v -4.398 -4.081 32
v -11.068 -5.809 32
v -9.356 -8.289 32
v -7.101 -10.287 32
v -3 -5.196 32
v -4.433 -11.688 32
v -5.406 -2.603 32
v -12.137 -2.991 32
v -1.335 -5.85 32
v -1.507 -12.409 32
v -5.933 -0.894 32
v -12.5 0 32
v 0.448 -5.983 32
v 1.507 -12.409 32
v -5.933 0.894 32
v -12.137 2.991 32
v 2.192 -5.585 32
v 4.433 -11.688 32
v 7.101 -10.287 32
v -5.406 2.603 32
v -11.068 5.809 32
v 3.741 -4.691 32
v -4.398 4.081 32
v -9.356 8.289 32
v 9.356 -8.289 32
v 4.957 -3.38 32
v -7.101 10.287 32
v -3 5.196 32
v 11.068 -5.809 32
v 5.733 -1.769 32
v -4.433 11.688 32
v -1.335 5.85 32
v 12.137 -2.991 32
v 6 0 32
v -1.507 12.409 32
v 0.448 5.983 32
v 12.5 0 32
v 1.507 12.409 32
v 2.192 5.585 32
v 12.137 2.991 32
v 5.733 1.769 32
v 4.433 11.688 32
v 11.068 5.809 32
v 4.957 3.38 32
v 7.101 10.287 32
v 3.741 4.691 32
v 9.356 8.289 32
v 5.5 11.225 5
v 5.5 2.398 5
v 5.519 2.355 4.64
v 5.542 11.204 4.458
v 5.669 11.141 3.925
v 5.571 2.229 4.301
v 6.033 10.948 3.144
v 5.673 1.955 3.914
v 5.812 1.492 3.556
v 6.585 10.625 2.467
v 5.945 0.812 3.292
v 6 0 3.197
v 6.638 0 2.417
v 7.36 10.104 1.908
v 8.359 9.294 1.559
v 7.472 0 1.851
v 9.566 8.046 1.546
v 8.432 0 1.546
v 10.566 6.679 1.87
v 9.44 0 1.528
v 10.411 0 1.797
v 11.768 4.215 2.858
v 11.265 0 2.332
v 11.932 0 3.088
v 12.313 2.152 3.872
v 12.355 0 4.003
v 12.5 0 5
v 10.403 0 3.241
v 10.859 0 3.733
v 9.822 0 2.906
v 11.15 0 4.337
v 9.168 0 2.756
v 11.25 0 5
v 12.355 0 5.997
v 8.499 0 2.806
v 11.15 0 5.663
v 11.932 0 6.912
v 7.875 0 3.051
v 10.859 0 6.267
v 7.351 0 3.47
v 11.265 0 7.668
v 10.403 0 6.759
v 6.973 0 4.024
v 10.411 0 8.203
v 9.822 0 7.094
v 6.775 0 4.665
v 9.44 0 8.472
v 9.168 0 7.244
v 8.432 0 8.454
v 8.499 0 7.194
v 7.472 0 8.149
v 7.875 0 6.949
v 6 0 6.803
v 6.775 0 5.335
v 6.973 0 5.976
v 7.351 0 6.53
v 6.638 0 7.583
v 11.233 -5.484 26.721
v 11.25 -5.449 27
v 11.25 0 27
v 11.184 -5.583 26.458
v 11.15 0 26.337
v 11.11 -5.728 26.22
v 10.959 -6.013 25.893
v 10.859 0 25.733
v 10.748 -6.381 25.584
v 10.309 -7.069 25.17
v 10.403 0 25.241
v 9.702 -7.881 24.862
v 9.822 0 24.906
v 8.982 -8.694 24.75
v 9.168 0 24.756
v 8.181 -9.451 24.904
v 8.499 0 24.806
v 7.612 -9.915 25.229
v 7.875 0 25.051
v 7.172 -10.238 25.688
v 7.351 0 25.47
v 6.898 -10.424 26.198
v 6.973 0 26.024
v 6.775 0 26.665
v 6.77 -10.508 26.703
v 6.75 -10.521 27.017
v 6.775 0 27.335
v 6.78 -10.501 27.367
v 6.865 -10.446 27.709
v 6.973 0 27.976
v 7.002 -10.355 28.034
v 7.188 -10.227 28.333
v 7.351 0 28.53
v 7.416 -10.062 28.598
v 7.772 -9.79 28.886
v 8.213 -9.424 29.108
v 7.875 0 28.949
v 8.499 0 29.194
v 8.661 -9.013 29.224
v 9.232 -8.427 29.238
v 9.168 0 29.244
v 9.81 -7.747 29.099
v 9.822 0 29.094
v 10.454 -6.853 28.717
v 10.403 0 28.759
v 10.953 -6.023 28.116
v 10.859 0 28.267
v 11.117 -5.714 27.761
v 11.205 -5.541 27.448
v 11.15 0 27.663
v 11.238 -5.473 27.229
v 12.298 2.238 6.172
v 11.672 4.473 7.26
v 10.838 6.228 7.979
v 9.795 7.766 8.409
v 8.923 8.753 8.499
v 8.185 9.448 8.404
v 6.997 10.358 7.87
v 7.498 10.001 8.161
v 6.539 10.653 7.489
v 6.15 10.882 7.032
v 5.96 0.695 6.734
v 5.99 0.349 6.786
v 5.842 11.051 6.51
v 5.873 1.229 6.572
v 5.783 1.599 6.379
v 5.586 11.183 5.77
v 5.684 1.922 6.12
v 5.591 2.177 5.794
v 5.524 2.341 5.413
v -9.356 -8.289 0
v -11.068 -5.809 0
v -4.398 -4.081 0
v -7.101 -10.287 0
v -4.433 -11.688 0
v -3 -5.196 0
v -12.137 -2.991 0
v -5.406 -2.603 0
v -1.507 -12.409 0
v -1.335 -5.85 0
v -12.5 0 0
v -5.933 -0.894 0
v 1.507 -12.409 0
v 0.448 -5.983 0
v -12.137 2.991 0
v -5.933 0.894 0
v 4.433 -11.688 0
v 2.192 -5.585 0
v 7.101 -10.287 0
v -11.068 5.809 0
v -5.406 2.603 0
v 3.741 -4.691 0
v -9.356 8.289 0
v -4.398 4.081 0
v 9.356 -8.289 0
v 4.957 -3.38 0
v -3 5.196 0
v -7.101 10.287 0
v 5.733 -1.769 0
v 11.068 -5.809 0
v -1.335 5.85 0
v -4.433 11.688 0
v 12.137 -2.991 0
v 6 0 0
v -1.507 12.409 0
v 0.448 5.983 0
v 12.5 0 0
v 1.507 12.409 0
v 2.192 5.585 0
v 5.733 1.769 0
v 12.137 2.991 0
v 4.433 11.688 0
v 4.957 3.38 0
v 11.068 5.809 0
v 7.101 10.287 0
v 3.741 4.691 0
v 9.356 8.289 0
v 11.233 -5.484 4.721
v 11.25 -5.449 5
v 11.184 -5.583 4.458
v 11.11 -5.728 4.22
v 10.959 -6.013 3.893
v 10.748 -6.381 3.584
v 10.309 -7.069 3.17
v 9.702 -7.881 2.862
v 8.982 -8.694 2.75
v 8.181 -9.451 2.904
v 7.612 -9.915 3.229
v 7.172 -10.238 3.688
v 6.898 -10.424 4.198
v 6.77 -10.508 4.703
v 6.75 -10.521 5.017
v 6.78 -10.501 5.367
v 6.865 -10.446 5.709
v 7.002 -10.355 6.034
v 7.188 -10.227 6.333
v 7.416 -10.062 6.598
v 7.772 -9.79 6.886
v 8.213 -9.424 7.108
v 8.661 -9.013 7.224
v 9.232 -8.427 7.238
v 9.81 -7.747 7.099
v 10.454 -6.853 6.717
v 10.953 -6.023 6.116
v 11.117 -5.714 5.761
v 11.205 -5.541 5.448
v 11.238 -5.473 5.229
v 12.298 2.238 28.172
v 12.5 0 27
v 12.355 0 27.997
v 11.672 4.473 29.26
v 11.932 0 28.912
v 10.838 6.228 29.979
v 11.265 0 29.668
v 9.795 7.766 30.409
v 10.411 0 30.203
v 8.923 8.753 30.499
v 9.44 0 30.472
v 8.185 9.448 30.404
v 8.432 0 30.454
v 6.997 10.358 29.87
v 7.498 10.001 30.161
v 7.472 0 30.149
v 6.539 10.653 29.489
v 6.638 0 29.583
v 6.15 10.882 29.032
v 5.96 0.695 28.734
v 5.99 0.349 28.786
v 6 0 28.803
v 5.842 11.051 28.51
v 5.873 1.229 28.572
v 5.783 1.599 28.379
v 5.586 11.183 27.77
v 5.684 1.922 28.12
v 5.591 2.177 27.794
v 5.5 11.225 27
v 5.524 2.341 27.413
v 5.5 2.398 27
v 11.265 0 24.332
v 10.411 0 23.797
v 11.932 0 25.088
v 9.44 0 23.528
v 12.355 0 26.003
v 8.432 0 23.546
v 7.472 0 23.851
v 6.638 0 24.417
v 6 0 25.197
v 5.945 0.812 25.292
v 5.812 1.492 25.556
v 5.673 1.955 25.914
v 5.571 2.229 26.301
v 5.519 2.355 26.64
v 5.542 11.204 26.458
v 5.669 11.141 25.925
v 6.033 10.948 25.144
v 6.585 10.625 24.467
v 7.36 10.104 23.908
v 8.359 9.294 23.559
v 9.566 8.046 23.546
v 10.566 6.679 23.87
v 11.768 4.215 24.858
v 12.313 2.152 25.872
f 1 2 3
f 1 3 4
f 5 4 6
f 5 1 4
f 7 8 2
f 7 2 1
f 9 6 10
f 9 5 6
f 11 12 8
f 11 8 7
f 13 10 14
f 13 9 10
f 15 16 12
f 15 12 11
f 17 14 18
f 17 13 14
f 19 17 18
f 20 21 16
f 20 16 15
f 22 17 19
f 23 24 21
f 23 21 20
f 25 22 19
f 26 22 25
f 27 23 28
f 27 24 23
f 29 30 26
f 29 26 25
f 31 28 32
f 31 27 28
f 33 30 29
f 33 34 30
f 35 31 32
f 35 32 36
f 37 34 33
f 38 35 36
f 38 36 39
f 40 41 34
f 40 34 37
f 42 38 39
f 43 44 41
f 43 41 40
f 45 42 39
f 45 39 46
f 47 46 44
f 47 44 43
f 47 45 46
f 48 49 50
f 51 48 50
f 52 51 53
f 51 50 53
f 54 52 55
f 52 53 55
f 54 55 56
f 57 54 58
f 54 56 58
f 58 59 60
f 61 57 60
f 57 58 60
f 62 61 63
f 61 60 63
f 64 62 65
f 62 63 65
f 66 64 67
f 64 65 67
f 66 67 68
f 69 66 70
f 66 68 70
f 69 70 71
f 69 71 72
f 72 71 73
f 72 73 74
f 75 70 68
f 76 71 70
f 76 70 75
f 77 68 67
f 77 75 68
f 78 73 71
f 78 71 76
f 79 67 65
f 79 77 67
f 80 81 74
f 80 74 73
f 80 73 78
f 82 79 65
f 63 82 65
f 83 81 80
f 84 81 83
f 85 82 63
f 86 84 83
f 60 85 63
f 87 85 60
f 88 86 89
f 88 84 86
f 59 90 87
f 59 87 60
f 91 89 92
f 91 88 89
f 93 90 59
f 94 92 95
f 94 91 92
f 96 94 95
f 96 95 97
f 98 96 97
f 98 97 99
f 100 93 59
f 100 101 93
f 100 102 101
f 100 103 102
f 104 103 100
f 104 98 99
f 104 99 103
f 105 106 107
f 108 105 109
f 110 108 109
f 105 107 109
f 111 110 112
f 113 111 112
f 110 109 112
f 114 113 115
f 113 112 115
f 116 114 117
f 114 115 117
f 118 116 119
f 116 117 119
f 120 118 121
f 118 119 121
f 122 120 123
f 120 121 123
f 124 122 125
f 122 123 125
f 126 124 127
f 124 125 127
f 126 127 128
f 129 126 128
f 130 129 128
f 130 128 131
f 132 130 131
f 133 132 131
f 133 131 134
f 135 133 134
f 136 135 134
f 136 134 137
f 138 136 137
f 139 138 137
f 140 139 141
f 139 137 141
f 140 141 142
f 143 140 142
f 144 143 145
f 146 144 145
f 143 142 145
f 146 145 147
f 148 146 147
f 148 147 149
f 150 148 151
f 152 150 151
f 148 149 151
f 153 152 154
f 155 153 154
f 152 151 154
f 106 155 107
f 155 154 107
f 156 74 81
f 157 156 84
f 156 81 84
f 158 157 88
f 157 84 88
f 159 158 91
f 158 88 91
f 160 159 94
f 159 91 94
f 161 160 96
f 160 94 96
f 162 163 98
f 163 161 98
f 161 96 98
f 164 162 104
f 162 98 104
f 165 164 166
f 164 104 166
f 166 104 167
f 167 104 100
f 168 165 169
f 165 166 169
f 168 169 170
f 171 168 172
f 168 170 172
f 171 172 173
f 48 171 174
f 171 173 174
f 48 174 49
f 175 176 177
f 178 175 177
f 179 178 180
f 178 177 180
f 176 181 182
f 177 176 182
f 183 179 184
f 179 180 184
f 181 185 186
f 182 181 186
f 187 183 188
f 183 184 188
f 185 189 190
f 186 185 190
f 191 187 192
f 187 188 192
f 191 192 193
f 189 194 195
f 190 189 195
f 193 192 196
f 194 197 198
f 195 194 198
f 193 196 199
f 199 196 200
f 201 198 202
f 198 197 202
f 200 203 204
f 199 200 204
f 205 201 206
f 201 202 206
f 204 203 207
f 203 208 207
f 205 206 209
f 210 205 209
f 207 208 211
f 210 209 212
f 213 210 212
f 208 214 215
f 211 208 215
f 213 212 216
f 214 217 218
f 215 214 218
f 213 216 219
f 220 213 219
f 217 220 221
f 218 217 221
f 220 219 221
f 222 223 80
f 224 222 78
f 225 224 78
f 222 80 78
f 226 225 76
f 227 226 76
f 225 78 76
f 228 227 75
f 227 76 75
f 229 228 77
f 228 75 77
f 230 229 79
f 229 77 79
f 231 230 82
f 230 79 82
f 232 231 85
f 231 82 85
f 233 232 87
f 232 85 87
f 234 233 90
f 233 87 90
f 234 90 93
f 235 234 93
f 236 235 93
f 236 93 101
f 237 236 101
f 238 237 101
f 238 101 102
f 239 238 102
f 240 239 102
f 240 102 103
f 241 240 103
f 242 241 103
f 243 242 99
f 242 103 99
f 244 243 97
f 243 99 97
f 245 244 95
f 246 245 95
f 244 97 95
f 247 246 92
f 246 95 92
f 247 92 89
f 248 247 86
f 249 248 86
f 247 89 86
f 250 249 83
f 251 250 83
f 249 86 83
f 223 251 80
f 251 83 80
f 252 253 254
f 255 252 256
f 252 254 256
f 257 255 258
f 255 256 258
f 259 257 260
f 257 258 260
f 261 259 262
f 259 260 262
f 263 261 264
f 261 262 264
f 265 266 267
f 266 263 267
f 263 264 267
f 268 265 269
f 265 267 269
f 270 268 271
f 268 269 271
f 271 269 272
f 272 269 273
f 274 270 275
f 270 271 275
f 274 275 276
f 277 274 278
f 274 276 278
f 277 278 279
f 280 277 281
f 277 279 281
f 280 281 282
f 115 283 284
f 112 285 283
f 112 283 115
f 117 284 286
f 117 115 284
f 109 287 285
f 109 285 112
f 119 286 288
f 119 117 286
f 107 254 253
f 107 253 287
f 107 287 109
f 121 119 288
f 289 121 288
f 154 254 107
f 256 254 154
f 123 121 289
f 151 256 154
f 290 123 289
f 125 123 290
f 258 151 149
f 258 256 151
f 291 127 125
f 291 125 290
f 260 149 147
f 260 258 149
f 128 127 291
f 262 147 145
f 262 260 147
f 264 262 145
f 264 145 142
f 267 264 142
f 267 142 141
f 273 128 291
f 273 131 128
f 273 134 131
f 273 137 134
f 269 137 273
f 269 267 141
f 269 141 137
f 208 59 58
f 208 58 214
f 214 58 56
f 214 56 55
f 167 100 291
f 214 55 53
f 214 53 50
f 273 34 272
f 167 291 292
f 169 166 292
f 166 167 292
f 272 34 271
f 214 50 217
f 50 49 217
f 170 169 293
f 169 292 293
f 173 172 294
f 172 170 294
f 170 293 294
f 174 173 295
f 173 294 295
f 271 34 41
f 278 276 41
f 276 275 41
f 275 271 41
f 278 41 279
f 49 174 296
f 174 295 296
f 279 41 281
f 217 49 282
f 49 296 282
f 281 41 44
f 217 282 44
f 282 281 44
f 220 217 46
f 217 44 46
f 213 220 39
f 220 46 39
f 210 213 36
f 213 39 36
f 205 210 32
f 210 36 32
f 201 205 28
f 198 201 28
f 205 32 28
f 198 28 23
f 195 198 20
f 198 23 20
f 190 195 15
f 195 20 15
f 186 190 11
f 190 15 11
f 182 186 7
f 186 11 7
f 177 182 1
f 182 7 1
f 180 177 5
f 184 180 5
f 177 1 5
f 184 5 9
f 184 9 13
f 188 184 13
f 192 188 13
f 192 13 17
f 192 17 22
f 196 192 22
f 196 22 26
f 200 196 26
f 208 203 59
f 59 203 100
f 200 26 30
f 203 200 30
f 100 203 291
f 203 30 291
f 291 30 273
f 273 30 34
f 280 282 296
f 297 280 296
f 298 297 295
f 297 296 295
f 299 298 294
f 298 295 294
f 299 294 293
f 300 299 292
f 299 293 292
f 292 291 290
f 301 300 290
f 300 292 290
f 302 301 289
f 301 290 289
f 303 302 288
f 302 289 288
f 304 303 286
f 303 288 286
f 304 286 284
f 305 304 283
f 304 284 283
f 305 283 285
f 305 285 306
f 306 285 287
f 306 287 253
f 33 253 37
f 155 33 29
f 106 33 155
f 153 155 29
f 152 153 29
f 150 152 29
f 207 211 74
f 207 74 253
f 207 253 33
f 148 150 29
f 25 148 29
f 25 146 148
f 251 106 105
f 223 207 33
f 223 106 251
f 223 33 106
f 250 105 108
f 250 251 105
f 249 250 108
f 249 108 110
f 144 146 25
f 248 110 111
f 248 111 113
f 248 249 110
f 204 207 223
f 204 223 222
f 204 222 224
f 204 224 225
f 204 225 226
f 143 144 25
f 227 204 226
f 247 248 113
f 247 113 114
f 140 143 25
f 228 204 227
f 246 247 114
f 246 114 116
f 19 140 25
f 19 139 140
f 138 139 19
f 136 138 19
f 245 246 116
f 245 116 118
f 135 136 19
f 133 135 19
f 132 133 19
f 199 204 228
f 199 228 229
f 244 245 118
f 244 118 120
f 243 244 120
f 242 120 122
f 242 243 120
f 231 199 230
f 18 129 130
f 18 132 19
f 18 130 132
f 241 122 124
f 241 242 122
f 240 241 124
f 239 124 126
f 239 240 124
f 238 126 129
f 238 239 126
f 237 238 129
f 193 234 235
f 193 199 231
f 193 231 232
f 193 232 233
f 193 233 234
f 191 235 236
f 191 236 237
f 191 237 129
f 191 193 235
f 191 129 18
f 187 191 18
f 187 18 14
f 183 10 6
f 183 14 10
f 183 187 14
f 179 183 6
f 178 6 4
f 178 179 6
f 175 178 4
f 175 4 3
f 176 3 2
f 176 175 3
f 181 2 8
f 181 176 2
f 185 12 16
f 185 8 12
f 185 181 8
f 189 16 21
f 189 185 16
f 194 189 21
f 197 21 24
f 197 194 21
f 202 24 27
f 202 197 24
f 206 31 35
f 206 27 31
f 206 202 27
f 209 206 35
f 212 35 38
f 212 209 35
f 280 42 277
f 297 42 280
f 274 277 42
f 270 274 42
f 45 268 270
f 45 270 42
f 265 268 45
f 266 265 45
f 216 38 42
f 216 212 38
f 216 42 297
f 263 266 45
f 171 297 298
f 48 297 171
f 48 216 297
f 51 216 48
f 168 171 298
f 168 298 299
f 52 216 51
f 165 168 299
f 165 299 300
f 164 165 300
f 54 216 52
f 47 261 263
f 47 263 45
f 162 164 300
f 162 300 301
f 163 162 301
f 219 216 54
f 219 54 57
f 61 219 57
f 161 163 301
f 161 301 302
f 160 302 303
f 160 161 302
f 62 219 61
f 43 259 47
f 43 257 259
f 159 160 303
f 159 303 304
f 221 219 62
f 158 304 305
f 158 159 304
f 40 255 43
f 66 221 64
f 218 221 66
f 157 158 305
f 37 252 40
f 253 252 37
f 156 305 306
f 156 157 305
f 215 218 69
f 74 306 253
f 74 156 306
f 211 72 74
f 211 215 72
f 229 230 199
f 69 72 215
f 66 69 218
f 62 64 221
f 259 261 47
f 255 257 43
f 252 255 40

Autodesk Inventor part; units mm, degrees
ref_plane "YZ Plane" through (0, 0, 0) normal (1, 0, 0) x (0, 1, 0)
ref_plane "XZ Plane" through (0, 0, 0) normal (0, 1, 0) x (-1, 0, 0)
ref_plane "XY Plane" through (0, 0, 0) normal (0, 0, 1) x (1, 0, 0)
sketch "Szkic1" plane through (0, 0, 0) normal (0, 0, 1) x (1, 0, 0)
  circle A0 centre (0, 0) radius 12.5
  dimension "d0" = 25
extrude "Wyciągnięcie proste1" add sketch "Szkic1" along normal blind 32
sketch "Szkic2" plane through (0, 0, 32) normal (0, 0, 1) x (1, 0, 0)
  circle A0 centre (0, 0) radius 6
  dimension "d3" = 12
extrude "Wyciągnięcie proste2" cut sketch "Szkic2" against normal blind 32
sketch "Szkic3" plane through (0, 0, 0) normal (0, 1, 0) x (-1, 0, 0)
  circle A0 centre (-9, 5) radius 2
  circle A1 centre (-9, 27) radius 2
  line L0 (0, 0) -> (0, -10.8071)
  circle A2 centre (-9, 27) radius 3.5
  circle A3 centre (-9, 5) radius 3.5
  line L1 (-12.5, 0) -> (12.5, 0) projected
  line L2 (12.5, 32) -> (-12.5, 32) projected
  dimension "d6" = 4
  dimension "d7" = 4
  dimension "d8" = 9
  dimension "d9" = 9
  dimension "d10" = 7
  dimension "d11" = 7
  dimension "d12" = 5
  dimension "d13" = 5
extrude "Wyciągnięcie proste3" cut sketch "Szkic3" along normal blind 32 contours A0 | A1 | A2 | A3
sketch "Szkic4" plane through (0, 0, 0) normal (0, 1, 0) x (1, 0, 0)
  circle A0 centre (9, -27) radius 2.25
  circle A1 centre (9, -5) radius 2.25
  arc A2 (6, -6.8028) -> (12.5, -5) centre (9, -5) ccw projected
  arc A3 (12.5, -27) -> (6, -25.1972) centre (9, -27) ccw projected
  point P0 (0, 0)
  dimension "d16" = 4.5
  dimension "d17" = 4.5
extrude "Wyciągnięcie proste4" cut sketch "Szkic4" against normal blind 32
properties part number "Cartesian1_12_12_Clutch" material "Stal, stopowa"
